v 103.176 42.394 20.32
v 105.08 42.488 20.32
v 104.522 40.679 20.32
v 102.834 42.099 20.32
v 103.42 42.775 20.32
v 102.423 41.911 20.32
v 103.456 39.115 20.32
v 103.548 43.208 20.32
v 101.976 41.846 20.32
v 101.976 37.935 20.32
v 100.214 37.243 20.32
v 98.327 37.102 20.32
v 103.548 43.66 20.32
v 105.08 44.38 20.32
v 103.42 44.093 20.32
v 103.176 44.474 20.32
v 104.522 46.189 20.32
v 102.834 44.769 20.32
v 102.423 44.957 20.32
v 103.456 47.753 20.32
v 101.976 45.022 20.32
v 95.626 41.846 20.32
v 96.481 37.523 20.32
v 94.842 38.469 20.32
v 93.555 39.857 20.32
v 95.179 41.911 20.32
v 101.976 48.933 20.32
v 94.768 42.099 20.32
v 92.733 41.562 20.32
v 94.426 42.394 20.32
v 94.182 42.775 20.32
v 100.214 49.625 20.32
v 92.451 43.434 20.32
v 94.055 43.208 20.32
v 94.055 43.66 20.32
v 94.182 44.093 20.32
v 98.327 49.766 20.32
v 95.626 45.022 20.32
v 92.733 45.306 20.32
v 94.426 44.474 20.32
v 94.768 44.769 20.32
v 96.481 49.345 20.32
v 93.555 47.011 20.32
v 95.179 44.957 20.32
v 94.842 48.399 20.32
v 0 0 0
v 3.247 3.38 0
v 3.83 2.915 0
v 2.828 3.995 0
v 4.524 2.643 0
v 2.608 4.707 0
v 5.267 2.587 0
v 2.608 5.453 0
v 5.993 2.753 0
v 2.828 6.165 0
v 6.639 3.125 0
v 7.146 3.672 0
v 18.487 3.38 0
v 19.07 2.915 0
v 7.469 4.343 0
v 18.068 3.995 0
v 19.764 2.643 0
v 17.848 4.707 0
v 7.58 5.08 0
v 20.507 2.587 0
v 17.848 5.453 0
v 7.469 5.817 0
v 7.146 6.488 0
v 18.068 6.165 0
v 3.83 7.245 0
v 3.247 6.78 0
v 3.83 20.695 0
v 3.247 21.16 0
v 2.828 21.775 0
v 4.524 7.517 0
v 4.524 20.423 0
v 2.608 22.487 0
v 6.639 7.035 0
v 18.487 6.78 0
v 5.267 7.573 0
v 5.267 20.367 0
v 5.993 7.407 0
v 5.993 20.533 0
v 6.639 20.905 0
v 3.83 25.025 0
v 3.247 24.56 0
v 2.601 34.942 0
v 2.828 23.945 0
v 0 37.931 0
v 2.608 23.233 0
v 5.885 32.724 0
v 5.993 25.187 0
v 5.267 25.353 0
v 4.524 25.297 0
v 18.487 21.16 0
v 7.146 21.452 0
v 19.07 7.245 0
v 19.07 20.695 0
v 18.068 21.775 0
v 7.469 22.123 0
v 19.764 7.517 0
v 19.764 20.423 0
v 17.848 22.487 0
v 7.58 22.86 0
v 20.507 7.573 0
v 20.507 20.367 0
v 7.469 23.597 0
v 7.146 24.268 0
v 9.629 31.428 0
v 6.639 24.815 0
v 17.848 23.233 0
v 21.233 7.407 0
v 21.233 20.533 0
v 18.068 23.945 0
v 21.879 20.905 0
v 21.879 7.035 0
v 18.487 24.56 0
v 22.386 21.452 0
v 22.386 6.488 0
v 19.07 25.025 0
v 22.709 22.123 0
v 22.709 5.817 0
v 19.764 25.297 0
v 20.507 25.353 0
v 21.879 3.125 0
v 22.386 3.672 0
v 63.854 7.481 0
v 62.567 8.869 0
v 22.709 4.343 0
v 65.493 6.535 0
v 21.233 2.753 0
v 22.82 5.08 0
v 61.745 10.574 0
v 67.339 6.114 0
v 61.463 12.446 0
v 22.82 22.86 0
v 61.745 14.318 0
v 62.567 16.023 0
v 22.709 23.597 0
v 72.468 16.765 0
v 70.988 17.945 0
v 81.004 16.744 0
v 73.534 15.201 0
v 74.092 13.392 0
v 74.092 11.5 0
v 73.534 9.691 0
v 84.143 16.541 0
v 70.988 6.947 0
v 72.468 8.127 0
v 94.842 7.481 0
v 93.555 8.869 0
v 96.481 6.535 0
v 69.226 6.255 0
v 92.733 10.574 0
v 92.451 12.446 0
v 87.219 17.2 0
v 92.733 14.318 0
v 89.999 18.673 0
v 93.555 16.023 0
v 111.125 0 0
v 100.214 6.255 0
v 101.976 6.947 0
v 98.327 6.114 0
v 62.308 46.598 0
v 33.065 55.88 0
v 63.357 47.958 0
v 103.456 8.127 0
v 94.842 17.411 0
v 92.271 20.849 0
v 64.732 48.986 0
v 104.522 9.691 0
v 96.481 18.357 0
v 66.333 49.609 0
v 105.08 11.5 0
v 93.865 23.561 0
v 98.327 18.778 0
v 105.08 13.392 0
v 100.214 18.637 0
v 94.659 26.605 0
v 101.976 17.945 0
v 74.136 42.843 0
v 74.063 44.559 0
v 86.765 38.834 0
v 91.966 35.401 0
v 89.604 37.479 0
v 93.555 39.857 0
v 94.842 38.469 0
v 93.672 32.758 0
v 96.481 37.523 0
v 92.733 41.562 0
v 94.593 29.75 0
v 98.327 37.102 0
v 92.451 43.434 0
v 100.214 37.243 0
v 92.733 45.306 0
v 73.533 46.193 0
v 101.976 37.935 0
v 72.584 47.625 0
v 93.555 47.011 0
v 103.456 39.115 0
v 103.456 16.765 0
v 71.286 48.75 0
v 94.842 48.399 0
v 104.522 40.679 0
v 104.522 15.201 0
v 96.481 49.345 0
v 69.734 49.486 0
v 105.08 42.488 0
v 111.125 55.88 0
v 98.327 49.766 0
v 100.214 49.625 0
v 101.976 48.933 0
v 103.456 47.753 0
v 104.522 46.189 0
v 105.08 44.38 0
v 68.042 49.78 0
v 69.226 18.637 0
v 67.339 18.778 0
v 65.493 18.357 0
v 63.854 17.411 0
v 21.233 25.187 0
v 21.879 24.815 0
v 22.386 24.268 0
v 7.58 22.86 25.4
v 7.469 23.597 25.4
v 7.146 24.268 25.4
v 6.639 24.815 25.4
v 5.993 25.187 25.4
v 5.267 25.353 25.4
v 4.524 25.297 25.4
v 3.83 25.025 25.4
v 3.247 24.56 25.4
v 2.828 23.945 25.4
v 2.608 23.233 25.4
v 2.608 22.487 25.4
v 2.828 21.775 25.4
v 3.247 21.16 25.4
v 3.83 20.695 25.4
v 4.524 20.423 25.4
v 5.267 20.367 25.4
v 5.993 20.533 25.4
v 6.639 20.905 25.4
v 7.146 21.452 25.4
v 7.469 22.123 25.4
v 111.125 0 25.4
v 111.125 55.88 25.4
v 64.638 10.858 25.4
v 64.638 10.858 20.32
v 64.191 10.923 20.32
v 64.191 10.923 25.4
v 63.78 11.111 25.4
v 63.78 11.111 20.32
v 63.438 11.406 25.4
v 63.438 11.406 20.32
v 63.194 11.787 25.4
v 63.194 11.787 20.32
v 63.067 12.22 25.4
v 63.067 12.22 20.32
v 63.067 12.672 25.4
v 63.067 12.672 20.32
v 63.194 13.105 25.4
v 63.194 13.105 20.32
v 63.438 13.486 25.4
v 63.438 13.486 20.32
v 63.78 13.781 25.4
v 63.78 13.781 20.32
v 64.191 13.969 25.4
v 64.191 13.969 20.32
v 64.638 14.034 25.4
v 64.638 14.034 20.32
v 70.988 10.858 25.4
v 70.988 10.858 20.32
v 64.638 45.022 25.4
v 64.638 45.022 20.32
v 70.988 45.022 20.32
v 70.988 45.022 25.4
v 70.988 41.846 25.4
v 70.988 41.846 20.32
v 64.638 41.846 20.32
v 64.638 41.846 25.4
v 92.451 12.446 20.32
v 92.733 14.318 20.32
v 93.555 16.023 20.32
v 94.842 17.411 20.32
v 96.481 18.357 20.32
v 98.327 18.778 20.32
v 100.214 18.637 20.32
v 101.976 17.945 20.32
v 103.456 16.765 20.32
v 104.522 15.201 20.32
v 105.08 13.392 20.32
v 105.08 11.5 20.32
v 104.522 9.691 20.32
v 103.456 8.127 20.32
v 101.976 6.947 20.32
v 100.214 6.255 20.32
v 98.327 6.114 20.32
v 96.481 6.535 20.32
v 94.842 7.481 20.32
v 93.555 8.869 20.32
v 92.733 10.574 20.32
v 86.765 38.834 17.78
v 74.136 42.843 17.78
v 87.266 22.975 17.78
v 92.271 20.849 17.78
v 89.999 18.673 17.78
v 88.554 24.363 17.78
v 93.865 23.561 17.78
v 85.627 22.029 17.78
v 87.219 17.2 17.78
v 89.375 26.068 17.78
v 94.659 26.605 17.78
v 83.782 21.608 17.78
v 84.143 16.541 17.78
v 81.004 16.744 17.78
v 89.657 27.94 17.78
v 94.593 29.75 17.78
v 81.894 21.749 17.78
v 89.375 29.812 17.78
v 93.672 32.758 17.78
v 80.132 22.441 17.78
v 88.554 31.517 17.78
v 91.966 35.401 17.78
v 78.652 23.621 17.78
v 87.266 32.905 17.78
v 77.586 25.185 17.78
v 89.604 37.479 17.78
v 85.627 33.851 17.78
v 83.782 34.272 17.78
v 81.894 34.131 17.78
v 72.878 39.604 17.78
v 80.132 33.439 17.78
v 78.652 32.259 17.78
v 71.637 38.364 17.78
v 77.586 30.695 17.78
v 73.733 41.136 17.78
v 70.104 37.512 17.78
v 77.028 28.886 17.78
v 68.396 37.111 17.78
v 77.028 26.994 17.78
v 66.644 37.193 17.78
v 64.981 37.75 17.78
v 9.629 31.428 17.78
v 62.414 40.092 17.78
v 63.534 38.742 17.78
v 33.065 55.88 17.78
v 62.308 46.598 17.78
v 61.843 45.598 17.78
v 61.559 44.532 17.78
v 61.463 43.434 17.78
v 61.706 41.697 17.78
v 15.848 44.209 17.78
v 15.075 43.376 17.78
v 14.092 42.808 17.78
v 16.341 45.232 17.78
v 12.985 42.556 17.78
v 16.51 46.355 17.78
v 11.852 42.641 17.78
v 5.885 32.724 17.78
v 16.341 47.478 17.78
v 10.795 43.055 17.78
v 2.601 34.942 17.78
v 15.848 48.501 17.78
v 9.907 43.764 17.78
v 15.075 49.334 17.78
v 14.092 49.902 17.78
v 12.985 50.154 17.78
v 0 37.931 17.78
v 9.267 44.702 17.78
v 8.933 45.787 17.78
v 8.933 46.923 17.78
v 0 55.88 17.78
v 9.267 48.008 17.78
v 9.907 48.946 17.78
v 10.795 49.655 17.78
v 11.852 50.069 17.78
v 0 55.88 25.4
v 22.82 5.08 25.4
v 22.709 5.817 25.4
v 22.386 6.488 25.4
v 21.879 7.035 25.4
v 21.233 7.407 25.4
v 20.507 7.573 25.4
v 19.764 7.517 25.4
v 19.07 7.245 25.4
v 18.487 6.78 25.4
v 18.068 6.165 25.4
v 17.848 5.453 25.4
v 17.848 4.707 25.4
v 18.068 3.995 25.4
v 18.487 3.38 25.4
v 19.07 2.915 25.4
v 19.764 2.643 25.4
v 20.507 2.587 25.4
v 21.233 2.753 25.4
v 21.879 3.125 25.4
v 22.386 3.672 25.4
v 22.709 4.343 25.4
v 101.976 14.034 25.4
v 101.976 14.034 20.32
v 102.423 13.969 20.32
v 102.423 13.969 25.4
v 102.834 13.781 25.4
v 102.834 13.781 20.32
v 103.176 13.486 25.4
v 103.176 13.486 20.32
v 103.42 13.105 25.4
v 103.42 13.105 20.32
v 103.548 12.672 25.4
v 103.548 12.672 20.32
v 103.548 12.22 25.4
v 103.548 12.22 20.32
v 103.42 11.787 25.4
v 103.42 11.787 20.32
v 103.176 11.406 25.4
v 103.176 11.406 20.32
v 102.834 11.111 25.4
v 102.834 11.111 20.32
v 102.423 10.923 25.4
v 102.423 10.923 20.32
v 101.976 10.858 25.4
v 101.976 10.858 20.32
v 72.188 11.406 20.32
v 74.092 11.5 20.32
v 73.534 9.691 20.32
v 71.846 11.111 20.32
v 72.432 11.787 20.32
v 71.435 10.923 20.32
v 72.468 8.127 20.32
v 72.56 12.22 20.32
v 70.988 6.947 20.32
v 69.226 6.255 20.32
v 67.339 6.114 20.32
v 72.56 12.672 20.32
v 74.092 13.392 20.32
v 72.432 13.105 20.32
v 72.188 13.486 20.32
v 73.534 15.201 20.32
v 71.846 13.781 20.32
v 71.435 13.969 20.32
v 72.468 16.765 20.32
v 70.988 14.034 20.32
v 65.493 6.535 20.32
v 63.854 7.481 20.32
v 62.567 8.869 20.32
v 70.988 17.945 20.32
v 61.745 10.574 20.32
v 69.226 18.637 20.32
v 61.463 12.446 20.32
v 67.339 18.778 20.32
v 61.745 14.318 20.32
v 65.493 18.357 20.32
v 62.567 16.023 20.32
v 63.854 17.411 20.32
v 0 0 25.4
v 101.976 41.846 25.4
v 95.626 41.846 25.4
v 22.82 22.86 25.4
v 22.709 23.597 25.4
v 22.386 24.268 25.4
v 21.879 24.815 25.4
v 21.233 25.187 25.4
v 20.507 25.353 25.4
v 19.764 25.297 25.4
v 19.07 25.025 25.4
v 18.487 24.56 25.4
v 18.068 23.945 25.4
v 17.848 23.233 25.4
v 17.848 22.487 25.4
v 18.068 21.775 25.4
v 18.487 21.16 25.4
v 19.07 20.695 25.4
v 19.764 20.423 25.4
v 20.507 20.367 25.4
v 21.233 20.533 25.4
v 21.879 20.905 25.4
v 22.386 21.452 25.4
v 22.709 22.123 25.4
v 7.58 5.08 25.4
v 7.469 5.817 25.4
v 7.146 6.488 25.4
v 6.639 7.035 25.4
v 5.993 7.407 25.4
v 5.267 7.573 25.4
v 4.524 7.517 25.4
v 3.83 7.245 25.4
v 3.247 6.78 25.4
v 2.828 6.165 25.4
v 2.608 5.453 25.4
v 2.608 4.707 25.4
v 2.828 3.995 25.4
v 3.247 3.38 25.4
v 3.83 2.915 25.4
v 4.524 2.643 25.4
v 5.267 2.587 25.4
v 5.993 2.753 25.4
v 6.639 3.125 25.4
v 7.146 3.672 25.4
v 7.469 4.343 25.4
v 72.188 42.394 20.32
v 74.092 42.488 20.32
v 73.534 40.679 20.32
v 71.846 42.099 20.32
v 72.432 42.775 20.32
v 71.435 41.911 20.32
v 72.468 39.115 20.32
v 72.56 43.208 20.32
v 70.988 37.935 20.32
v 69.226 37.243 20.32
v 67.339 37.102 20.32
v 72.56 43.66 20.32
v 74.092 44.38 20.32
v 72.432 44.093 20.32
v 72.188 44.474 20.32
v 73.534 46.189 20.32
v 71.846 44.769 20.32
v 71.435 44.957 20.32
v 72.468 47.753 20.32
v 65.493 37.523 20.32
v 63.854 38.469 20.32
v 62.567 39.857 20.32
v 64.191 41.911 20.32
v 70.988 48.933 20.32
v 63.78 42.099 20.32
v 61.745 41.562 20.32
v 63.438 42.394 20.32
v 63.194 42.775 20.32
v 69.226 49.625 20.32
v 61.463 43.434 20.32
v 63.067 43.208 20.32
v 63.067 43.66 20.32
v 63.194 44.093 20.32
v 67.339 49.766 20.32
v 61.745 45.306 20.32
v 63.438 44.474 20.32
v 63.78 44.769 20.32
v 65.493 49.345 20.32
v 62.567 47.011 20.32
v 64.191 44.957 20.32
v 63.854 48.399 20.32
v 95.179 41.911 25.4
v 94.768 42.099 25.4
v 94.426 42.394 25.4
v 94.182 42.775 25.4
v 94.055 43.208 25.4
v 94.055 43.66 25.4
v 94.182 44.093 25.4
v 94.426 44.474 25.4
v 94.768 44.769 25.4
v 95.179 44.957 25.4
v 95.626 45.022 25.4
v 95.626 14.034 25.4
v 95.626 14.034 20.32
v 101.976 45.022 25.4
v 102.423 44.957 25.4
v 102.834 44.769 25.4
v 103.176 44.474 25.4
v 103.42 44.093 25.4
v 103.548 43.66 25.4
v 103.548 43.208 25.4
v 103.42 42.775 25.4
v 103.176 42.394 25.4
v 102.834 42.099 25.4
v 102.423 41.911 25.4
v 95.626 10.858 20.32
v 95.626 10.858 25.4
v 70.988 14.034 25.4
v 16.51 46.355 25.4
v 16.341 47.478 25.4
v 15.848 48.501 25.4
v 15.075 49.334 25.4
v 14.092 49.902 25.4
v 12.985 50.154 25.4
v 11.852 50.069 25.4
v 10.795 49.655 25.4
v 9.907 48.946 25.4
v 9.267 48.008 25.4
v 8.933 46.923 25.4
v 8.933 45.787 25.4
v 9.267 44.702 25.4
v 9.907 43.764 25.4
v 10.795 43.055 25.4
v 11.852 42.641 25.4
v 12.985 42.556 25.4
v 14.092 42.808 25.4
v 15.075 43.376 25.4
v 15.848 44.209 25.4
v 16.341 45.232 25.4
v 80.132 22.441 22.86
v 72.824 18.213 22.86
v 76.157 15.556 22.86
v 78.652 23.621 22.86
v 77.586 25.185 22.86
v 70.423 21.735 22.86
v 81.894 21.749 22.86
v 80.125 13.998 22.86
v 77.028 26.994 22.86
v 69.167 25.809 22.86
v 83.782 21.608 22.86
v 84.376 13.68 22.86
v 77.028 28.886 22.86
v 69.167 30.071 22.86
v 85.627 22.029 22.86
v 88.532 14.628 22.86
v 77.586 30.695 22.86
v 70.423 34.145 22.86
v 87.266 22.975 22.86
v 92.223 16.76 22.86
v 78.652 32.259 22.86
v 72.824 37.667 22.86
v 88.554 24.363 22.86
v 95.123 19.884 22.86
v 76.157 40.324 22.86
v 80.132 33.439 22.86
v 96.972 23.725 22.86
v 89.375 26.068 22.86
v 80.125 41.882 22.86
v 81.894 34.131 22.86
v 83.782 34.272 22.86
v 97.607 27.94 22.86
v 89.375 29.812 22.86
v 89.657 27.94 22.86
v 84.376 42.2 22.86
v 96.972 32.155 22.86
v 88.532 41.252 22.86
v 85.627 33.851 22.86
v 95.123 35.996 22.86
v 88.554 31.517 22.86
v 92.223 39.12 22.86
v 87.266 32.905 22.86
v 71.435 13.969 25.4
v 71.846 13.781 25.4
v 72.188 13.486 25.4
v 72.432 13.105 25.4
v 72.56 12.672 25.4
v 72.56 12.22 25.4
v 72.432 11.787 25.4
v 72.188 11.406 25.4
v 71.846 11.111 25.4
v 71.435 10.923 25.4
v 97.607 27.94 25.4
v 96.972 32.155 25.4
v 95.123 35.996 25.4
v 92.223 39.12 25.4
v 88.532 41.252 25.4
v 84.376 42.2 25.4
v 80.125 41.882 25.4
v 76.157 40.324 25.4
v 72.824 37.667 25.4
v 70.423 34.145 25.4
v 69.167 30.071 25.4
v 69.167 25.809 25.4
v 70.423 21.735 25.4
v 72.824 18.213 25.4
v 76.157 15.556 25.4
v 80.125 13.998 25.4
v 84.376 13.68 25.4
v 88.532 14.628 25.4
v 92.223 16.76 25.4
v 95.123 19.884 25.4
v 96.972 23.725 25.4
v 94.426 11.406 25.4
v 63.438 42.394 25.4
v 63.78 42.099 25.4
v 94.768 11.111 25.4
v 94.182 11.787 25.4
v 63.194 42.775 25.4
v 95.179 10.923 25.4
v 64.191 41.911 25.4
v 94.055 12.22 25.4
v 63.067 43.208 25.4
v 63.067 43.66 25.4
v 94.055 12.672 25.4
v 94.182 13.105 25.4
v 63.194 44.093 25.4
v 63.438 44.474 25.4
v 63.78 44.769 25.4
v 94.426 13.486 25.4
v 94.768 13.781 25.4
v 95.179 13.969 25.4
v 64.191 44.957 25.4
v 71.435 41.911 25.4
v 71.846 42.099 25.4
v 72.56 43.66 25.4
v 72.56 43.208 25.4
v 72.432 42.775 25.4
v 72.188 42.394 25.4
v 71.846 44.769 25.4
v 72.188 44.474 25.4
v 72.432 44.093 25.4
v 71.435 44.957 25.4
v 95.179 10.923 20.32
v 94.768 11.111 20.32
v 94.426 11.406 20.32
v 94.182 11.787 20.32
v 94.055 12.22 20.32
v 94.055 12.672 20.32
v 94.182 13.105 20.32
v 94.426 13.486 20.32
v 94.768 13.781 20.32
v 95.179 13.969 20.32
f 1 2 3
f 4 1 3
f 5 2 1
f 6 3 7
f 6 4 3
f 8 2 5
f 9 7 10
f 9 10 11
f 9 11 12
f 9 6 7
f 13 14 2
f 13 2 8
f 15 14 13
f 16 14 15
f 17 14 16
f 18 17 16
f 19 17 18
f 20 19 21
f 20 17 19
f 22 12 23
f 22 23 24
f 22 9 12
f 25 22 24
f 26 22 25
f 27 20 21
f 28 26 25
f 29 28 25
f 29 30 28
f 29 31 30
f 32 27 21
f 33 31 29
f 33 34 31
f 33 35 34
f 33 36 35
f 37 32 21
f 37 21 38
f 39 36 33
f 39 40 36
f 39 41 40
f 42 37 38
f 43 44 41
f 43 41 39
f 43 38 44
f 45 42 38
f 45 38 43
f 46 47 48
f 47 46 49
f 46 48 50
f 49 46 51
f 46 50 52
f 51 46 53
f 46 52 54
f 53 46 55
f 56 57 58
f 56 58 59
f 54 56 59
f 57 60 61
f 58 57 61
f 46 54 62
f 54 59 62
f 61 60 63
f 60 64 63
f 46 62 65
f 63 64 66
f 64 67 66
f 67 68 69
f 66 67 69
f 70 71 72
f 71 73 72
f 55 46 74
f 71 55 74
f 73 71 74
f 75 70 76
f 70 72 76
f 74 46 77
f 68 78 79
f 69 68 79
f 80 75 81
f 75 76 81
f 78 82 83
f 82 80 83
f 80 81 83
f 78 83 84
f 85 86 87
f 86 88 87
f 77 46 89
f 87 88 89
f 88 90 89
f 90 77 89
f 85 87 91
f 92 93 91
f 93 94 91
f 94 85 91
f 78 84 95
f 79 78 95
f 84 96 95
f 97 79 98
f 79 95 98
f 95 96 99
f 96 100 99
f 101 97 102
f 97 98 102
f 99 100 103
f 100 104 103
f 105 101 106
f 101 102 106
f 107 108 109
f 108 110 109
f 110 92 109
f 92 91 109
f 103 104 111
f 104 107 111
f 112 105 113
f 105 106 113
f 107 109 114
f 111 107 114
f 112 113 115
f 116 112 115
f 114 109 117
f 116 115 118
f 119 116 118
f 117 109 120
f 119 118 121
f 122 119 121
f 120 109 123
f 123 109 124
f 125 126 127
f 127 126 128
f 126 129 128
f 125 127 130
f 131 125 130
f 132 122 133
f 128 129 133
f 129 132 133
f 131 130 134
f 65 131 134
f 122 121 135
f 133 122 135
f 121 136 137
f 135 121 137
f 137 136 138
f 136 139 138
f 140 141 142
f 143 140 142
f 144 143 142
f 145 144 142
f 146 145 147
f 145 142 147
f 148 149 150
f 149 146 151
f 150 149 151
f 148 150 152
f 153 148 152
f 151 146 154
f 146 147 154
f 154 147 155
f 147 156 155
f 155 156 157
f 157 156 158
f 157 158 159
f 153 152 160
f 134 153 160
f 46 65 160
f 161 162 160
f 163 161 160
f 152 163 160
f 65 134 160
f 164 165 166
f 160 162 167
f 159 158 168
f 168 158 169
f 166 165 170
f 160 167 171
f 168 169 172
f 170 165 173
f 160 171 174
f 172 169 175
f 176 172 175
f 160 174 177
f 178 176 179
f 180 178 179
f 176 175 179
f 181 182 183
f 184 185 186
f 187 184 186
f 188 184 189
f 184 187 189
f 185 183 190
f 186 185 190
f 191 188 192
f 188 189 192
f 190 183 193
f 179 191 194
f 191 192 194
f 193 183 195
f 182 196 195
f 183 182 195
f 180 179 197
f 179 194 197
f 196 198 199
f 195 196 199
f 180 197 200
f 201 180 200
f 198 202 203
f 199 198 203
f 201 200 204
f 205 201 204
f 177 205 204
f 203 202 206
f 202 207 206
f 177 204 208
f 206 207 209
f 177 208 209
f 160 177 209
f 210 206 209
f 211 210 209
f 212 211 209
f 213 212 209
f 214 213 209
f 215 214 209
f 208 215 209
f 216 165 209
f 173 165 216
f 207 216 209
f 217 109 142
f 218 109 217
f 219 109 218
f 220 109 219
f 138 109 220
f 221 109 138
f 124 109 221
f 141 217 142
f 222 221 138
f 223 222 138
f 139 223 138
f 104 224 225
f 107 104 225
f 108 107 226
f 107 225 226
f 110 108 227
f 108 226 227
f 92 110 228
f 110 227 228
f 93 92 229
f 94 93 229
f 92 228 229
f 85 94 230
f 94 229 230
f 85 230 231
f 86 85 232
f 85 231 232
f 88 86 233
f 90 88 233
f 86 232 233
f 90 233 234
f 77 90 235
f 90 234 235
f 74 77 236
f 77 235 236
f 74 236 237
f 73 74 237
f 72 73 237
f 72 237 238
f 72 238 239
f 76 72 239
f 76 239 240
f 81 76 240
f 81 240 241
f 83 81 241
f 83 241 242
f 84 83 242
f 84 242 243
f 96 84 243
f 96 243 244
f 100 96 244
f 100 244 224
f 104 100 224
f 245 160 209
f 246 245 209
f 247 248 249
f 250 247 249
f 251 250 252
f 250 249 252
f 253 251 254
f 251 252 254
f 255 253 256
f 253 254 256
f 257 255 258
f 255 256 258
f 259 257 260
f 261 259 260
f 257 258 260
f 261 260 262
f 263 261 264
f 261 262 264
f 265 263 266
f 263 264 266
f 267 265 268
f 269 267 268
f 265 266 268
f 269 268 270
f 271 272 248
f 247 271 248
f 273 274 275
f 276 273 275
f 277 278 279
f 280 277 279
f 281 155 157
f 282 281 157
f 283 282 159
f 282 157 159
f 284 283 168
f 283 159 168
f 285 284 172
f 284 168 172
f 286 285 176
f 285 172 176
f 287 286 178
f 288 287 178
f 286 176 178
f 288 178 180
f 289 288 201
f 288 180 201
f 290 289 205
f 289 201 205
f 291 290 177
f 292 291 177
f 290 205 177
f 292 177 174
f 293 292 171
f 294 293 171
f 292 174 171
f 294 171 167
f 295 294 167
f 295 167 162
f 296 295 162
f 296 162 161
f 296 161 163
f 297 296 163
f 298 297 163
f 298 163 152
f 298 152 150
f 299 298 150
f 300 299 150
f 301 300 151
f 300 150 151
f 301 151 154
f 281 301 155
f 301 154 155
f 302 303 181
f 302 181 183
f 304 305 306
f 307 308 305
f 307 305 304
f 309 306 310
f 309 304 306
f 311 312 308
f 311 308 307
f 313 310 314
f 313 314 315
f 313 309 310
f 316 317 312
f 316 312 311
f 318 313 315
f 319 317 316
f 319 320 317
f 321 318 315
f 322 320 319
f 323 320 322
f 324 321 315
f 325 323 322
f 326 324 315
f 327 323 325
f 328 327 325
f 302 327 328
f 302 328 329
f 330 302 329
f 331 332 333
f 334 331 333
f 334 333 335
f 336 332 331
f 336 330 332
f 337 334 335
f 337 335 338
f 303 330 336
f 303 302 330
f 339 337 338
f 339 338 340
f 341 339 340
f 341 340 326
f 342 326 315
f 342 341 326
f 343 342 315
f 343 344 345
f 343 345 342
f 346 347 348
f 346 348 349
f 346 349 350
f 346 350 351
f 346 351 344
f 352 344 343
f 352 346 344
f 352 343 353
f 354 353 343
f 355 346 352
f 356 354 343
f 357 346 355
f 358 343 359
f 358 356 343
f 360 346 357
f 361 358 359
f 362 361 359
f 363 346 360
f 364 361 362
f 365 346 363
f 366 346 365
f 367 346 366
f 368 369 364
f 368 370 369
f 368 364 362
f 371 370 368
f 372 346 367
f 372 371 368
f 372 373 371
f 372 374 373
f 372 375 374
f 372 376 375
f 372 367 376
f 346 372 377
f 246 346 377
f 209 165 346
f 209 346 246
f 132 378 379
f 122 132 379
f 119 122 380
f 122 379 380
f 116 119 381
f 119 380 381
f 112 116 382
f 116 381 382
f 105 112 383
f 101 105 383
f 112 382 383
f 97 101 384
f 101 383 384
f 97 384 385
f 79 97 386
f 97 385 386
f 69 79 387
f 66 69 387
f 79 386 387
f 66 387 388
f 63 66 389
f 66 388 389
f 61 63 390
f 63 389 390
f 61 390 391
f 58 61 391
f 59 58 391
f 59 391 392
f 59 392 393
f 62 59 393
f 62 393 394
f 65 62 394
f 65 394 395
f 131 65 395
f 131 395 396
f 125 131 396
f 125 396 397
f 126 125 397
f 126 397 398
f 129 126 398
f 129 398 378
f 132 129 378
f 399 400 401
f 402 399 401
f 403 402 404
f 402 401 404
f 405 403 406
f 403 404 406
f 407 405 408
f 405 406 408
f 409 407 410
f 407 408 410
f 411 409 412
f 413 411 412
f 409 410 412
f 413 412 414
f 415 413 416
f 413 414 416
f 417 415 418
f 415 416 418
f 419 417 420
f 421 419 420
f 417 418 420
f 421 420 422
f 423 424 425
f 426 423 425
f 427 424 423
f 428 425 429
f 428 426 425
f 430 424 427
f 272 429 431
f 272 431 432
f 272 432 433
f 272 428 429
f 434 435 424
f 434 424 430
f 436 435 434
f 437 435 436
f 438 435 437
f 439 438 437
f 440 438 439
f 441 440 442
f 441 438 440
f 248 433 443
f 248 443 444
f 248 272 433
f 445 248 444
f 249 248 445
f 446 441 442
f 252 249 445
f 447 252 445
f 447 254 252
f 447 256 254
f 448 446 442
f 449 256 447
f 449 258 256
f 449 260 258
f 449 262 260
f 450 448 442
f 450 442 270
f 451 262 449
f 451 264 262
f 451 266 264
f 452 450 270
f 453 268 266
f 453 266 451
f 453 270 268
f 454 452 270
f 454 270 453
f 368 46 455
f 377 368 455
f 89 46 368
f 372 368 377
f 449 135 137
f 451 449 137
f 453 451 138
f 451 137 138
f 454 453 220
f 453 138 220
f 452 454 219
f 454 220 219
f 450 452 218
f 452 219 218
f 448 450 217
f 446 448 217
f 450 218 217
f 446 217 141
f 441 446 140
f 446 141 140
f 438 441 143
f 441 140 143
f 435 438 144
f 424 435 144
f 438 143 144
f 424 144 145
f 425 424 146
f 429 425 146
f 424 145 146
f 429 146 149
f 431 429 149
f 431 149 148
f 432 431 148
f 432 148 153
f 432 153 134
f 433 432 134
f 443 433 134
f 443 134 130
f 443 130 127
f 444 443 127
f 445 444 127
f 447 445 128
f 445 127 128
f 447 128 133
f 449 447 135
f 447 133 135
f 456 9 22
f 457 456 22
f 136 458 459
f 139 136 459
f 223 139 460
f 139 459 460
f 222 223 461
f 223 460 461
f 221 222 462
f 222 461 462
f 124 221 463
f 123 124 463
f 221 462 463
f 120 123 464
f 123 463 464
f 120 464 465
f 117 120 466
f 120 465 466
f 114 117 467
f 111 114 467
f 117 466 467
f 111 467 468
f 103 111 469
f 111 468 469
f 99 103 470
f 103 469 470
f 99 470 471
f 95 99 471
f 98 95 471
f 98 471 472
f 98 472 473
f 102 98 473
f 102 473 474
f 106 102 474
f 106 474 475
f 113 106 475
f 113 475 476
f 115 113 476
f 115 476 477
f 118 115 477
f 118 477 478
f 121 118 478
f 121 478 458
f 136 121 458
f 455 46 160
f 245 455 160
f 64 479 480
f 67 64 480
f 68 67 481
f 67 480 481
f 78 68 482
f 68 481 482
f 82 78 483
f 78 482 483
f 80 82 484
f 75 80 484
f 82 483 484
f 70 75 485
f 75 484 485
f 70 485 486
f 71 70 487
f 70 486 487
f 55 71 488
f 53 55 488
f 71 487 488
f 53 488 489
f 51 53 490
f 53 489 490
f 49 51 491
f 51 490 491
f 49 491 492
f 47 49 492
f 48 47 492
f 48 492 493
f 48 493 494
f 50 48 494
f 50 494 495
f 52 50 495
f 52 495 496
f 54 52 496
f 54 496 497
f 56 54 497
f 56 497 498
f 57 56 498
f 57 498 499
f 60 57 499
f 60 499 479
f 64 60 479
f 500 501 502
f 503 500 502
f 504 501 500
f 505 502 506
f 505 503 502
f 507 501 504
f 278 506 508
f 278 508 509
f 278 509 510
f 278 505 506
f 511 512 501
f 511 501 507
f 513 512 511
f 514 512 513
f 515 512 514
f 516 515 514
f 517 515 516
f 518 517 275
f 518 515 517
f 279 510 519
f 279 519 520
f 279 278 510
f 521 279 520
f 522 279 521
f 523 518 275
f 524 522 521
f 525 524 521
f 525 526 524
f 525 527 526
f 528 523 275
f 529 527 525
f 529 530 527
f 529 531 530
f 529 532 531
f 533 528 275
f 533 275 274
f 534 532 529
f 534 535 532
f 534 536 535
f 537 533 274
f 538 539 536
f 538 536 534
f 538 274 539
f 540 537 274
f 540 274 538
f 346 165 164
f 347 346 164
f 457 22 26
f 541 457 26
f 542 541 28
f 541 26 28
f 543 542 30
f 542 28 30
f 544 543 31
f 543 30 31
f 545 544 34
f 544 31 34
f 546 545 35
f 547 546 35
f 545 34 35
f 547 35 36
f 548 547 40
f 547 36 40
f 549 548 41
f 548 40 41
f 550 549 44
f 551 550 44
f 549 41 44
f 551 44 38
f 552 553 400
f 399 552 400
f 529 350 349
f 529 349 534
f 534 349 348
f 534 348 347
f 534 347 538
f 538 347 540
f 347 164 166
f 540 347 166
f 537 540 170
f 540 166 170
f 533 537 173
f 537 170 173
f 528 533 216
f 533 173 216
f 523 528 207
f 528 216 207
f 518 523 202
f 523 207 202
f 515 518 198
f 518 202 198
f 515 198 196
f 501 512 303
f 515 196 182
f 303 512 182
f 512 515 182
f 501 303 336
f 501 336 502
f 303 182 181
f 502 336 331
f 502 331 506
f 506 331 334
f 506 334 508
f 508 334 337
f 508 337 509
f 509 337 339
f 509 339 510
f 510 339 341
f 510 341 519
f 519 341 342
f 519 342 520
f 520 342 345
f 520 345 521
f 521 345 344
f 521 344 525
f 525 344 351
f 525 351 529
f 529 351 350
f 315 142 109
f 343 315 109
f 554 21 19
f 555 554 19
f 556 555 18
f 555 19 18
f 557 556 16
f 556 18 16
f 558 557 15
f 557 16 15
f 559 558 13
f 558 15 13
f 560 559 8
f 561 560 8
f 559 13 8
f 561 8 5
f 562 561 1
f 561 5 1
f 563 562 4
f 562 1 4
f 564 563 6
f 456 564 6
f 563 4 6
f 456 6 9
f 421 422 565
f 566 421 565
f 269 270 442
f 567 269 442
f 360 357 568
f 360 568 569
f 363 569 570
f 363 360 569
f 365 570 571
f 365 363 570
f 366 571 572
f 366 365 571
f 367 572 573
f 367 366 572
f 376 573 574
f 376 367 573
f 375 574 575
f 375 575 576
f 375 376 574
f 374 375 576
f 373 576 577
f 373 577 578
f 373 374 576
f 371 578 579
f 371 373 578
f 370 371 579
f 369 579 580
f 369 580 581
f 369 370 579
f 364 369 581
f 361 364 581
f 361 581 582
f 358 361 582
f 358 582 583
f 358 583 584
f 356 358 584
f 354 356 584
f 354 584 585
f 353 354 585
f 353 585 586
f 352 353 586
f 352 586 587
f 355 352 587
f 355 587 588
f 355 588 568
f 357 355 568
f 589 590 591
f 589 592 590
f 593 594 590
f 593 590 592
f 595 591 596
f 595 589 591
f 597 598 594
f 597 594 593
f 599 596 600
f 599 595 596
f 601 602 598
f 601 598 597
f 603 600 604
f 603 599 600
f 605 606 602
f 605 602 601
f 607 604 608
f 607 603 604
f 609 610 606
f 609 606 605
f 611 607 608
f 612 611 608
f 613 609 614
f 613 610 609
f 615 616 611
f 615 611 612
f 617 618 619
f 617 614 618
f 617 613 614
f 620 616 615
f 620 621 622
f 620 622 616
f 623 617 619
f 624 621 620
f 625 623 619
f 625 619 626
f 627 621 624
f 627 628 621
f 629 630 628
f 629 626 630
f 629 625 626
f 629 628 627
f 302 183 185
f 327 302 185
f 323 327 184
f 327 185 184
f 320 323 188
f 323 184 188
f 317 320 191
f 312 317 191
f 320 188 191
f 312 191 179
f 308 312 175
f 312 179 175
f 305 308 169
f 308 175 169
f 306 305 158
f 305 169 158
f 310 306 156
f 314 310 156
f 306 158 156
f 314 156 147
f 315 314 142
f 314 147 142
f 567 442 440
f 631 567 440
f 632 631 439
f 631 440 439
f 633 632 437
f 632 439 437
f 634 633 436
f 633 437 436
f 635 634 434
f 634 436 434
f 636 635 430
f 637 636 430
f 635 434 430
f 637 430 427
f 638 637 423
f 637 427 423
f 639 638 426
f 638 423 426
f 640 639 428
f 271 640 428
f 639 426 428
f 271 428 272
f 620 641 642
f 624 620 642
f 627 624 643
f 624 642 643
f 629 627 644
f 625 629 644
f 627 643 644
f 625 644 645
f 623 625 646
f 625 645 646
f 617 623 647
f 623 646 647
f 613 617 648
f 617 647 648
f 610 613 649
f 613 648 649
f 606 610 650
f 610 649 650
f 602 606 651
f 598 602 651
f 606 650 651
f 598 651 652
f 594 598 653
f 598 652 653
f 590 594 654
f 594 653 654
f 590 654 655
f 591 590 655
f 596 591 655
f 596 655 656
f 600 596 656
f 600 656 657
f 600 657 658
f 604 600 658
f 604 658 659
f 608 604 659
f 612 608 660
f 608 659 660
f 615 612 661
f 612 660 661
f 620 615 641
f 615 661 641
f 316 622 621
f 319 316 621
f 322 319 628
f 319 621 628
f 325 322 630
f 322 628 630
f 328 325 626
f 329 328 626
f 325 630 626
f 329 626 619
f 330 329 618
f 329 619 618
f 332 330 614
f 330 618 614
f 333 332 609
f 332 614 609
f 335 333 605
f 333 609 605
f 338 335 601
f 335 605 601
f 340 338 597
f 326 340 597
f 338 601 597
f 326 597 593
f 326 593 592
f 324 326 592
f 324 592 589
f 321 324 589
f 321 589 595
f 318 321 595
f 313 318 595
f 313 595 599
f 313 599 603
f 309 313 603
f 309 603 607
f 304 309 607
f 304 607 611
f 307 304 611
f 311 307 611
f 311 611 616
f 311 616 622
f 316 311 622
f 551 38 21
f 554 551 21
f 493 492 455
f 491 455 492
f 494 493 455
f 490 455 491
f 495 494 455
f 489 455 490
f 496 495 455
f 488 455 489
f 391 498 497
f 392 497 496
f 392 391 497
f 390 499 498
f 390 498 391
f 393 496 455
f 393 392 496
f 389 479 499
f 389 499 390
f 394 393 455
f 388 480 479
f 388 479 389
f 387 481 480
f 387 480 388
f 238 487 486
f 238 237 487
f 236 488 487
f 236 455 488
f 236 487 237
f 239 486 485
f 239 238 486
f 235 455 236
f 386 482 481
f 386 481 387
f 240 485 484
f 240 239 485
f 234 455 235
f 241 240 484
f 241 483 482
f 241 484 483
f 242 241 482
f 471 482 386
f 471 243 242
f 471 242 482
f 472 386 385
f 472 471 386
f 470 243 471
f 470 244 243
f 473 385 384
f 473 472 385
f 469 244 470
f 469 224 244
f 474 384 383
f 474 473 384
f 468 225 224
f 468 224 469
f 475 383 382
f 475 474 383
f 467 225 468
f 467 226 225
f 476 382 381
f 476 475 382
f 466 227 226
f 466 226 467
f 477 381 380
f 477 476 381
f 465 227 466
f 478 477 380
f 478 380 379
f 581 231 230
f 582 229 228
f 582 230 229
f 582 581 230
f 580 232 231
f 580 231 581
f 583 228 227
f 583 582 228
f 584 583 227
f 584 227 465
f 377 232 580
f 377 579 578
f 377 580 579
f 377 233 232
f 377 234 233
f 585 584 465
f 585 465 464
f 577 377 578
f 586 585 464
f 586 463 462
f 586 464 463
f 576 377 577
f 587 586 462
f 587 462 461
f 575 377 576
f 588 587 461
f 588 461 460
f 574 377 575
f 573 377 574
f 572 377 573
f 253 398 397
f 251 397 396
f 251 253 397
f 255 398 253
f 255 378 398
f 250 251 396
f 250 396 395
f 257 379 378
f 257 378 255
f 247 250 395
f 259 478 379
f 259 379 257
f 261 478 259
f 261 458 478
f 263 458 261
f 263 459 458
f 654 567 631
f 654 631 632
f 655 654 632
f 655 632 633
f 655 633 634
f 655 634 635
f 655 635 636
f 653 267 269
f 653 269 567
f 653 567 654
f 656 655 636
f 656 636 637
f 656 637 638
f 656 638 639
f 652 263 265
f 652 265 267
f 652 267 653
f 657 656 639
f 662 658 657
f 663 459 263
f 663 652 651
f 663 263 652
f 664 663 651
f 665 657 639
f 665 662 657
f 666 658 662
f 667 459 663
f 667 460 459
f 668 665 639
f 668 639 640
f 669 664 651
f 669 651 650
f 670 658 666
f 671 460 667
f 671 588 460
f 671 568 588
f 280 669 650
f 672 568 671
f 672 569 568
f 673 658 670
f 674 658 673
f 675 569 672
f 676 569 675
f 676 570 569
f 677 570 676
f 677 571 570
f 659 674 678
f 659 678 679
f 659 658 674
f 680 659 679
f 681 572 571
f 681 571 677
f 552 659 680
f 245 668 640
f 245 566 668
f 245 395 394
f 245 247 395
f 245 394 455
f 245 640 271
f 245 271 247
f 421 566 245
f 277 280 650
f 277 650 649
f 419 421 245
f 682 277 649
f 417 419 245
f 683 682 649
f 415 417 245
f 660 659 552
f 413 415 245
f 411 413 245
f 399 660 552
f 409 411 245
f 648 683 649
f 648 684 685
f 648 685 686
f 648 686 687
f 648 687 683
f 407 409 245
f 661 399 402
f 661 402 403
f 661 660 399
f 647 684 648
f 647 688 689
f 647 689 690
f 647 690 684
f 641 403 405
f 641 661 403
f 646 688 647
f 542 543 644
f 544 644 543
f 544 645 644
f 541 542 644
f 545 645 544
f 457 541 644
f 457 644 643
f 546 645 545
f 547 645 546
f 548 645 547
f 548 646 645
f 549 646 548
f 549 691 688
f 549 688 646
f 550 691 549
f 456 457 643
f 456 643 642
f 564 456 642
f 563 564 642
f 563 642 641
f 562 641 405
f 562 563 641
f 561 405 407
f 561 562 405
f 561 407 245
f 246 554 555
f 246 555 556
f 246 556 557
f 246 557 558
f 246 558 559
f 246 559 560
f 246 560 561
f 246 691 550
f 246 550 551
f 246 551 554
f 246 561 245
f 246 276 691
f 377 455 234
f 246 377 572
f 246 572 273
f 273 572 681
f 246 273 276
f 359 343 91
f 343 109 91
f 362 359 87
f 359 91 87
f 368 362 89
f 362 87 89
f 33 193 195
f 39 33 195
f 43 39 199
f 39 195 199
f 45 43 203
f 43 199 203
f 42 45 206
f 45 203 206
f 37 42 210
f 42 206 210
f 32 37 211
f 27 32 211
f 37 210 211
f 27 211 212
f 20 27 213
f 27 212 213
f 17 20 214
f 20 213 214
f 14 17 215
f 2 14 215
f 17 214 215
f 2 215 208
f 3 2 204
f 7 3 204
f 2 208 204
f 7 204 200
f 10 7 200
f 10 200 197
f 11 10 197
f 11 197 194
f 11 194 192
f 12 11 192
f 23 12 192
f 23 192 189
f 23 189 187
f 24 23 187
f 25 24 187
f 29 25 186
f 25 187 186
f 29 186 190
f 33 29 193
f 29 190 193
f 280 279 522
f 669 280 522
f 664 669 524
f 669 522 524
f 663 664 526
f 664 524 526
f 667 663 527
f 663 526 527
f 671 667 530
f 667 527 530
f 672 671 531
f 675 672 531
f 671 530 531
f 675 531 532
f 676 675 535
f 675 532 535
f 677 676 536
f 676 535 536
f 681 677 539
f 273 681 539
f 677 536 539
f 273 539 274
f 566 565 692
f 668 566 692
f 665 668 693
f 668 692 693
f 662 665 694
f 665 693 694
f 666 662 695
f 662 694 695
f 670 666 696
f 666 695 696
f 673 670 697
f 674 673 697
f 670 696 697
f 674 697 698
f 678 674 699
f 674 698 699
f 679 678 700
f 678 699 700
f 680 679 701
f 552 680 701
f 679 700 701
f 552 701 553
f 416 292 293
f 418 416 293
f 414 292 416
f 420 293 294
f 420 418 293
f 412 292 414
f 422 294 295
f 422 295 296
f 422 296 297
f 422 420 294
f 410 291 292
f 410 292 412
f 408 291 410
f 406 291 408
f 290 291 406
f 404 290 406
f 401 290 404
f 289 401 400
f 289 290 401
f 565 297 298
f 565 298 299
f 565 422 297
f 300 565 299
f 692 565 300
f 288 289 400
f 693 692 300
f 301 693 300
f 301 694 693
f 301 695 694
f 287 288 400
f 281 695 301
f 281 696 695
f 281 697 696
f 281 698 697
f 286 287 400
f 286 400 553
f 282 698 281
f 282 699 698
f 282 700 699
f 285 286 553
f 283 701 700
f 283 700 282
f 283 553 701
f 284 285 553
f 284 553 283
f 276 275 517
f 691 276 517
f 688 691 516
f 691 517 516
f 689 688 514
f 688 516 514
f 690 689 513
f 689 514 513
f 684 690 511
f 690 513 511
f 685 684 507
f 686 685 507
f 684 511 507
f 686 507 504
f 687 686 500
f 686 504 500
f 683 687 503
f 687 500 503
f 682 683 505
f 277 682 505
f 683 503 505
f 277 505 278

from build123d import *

# Parameters (mm, degrees)
SKETCH2_W           = 111.125
SKETCH2_H           = 55.88
SKETCH2_R           = 3.81
BOSS_EXTRUDE1_DEPTH = 25.4
SKETCH4_R           = 15.24
CUT_EXTRUDE2_DEPTH  = 17.78
CUT_EXTRUDE3_DEPTH  = 17.78
SKETCH6_R           = 6.35
CUT_EXTRUDE4_DEPTH  = 20.32
SKETCH7_R           = 14.3002
CUT_EXTRUDE5_DEPTH  = 2.54
SKETCH8_R           = 6.35
CUT_EXTRUDE6_DEPTH  = 23.86
SKETCH9_R           = 11.43
SKETCH9_R_2         = 6.35
CUT_EXTRUDE7_DEPTH  = 17.78
SKETCH10_R          = 2.5
CUT_EXTRUDE8_DEPTH  = 26.4


with BuildPart() as part:
    # Sketch2 → Boss-Extrude1 (new body)
    with BuildSketch(Plane.XY):
        with Locations((55.5625, 27.94)):
            Rectangle(SKETCH2_W, SKETCH2_H)
        with Locations((12.7, 46.355)):
            Circle(SKETCH2_R, mode=Mode.SUBTRACT)
        with BuildLine():
            Line((70.988225187, 41.8465), (64.638225187, 41.8465))
            ThreePointArc((64.638225187, 41.8465), (63.050725187, 43.434), (64.638225187, 45.0215))
            Line((64.638225187, 45.0215), (70.988225187, 45.0215))
            ThreePointArc((70.988225187, 45.0215), (72.575725187, 43.434), (70.988225187, 41.8465))
        make_face(mode=Mode.SUBTRACT)
        with BuildLine():
            Line((101.976225187, 41.8465), (95.626225187, 41.8465))
            ThreePointArc((95.626225187, 41.8465), (94.038725187, 43.434), (95.626225187, 45.0215))
            Line((95.626225187, 45.0215), (101.976225187, 45.0215))
            ThreePointArc((101.976225187, 45.0215), (103.563725187, 43.434), (101.976225187, 41.8465))
        make_face(mode=Mode.SUBTRACT)
        with BuildLine():
            Line((101.976225187, 10.8585), (95.626225187, 10.8585))
            ThreePointArc((95.626225187, 10.8585), (94.038725187, 12.446), (95.626225187, 14.0335))
            Line((95.626225187, 14.0335), (101.976225187, 14.0335))
            ThreePointArc((101.976225187, 14.0335), (103.563725187, 12.446), (101.976225187, 10.8585))
        make_face(mode=Mode.SUBTRACT)
        with BuildLine():
            Line((70.988225187, 10.8585), (64.638225187, 10.8585))
            ThreePointArc((64.638225187, 10.8585), (63.050725187, 12.446), (64.638225187, 14.0335))
            Line((64.638225187, 14.0335), (70.988225187, 14.0335))
            ThreePointArc((70.988225187, 14.0335), (72.575725187, 12.446), (70.988225187, 10.8585))
        make_face(mode=Mode.SUBTRACT)
    extrude(amount=BOSS_EXTRUDE1_DEPTH)

    # Sketch4 → Cut-Extrude2 (cut)
    with BuildSketch(Plane(origin=(0, 0, 0), x_dir=(-1, 0, 0), z_dir=(0, 0, -1))):
        with Locations((-12.7, 46.355)):
            Circle(SKETCH4_R)
    extrude(amount=-CUT_EXTRUDE2_DEPTH, mode=Mode.SUBTRACT)

    # Sketch5 → Cut-Extrude3 (cut)
    with BuildSketch(Plane(origin=(0, 0, 0), x_dir=(-1, 0, 0), z_dir=(0, 0, -1))):
        with BuildLine():
            Line((0, 54.779226968), (0, 55.88))
            Line((0, 55.88), (-0.803278813, 55.88))
            ThreePointArc((-0.803278813, 55.88), (-0.389329888, 55.33859624), (0, 54.779226968))
        make_face()
    extrude(amount=-CUT_EXTRUDE3_DEPTH, mode=Mode.SUBTRACT)

    # Sketch6 → Cut-Extrude4 (cut)
    with BuildSketch(Plane(origin=(0, 0, 0), x_dir=(-1, 0, 0), z_dir=(0, 0, -1))):
        with Locations((-98.801225187, 43.434)):
            Circle(SKETCH6_R)
        with Locations((-98.801225187, 12.446)):
            Circle(SKETCH6_R)
        with Locations((-67.813225187, 43.434)):
            Circle(SKETCH6_R)
        with Locations((-67.813225187, 12.446)):
            Circle(SKETCH6_R)
    extrude(amount=-CUT_EXTRUDE4_DEPTH, mode=Mode.SUBTRACT)

    # Sketch7 → Cut-Extrude5 (cut)
    with BuildSketch(Plane.XY.offset(25.4)):
        with Locations((83.307225187, 27.94)):
            Circle(SKETCH7_R)
    extrude(amount=-CUT_EXTRUDE5_DEPTH, mode=Mode.SUBTRACT)

    # Sketch8 → Cut-Extrude6 (cut, through all)
    with BuildSketch(Plane.XY.offset(22.86)):
        with Locations((83.307225187, 27.94)):
            Circle(SKETCH8_R)
    extrude(amount=-CUT_EXTRUDE6_DEPTH, mode=Mode.SUBTRACT)

    # Sketch9 → Cut-Extrude7 (cut)
    with BuildSketch(Plane(origin=(0, 0, 0), x_dir=(-1, 0, 0), z_dir=(0, 0, -1))):
        with Locations((-83.307225187, 27.94)):
            Circle(SKETCH9_R)
        with Locations((-83.307225187, 27.94)):
            Circle(SKETCH9_R_2, mode=Mode.SUBTRACT)
        with BuildLine():
            Line((-74.135687658, 42.843264609), (-86.765332472, 38.834328525))
            ThreePointArc((-86.765332472, 38.834328525), (-76.557457275, 37.164181976), (-71.877225187, 27.94))
            ThreePointArc((-71.877225187, 27.94), (-74.448057171, 20.717809053), (-81.004091691, 16.744443913))
            Line((-81.004091691, 16.744443913), (-9.629155339, 31.427591884))
            ThreePointArc((-9.629155339, 31.427591884), (-25.698234103, 38.398649693), (-24.596721187, 55.88))
            Line((-24.596721187, 55.88), (-33.065105822, 55.88))
            Line((-33.065105822, 55.88), (-62.307510769, 46.597796572))
            ThreePointArc((-62.307510769, 46.597796572), (-61.677926231, 45.071255852), (-61.463225187, 43.434))
            ThreePointArc((-61.463225187, 43.434), (-67.517536745, 37.090888118), (-74.135687658, 42.843264609))
        make_face()
    extrude(amount=-CUT_EXTRUDE7_DEPTH, mode=Mode.SUBTRACT)

    # Sketch10 → Cut-Extrude8 (cut, through all)
    with BuildSketch(Plane.XY.offset(25.4)):
        with Locations((5.08, 5.08)):
            Circle(SKETCH10_R)
        with Locations((20.32, 5.08)):
            Circle(SKETCH10_R)
        with Locations((20.32, 22.86)):
            Circle(SKETCH10_R)
        with Locations((5.08, 22.86)):
            Circle(SKETCH10_R)
    extrude(amount=-CUT_EXTRUDE8_DEPTH, mode=Mode.SUBTRACT)


solid = part.part
